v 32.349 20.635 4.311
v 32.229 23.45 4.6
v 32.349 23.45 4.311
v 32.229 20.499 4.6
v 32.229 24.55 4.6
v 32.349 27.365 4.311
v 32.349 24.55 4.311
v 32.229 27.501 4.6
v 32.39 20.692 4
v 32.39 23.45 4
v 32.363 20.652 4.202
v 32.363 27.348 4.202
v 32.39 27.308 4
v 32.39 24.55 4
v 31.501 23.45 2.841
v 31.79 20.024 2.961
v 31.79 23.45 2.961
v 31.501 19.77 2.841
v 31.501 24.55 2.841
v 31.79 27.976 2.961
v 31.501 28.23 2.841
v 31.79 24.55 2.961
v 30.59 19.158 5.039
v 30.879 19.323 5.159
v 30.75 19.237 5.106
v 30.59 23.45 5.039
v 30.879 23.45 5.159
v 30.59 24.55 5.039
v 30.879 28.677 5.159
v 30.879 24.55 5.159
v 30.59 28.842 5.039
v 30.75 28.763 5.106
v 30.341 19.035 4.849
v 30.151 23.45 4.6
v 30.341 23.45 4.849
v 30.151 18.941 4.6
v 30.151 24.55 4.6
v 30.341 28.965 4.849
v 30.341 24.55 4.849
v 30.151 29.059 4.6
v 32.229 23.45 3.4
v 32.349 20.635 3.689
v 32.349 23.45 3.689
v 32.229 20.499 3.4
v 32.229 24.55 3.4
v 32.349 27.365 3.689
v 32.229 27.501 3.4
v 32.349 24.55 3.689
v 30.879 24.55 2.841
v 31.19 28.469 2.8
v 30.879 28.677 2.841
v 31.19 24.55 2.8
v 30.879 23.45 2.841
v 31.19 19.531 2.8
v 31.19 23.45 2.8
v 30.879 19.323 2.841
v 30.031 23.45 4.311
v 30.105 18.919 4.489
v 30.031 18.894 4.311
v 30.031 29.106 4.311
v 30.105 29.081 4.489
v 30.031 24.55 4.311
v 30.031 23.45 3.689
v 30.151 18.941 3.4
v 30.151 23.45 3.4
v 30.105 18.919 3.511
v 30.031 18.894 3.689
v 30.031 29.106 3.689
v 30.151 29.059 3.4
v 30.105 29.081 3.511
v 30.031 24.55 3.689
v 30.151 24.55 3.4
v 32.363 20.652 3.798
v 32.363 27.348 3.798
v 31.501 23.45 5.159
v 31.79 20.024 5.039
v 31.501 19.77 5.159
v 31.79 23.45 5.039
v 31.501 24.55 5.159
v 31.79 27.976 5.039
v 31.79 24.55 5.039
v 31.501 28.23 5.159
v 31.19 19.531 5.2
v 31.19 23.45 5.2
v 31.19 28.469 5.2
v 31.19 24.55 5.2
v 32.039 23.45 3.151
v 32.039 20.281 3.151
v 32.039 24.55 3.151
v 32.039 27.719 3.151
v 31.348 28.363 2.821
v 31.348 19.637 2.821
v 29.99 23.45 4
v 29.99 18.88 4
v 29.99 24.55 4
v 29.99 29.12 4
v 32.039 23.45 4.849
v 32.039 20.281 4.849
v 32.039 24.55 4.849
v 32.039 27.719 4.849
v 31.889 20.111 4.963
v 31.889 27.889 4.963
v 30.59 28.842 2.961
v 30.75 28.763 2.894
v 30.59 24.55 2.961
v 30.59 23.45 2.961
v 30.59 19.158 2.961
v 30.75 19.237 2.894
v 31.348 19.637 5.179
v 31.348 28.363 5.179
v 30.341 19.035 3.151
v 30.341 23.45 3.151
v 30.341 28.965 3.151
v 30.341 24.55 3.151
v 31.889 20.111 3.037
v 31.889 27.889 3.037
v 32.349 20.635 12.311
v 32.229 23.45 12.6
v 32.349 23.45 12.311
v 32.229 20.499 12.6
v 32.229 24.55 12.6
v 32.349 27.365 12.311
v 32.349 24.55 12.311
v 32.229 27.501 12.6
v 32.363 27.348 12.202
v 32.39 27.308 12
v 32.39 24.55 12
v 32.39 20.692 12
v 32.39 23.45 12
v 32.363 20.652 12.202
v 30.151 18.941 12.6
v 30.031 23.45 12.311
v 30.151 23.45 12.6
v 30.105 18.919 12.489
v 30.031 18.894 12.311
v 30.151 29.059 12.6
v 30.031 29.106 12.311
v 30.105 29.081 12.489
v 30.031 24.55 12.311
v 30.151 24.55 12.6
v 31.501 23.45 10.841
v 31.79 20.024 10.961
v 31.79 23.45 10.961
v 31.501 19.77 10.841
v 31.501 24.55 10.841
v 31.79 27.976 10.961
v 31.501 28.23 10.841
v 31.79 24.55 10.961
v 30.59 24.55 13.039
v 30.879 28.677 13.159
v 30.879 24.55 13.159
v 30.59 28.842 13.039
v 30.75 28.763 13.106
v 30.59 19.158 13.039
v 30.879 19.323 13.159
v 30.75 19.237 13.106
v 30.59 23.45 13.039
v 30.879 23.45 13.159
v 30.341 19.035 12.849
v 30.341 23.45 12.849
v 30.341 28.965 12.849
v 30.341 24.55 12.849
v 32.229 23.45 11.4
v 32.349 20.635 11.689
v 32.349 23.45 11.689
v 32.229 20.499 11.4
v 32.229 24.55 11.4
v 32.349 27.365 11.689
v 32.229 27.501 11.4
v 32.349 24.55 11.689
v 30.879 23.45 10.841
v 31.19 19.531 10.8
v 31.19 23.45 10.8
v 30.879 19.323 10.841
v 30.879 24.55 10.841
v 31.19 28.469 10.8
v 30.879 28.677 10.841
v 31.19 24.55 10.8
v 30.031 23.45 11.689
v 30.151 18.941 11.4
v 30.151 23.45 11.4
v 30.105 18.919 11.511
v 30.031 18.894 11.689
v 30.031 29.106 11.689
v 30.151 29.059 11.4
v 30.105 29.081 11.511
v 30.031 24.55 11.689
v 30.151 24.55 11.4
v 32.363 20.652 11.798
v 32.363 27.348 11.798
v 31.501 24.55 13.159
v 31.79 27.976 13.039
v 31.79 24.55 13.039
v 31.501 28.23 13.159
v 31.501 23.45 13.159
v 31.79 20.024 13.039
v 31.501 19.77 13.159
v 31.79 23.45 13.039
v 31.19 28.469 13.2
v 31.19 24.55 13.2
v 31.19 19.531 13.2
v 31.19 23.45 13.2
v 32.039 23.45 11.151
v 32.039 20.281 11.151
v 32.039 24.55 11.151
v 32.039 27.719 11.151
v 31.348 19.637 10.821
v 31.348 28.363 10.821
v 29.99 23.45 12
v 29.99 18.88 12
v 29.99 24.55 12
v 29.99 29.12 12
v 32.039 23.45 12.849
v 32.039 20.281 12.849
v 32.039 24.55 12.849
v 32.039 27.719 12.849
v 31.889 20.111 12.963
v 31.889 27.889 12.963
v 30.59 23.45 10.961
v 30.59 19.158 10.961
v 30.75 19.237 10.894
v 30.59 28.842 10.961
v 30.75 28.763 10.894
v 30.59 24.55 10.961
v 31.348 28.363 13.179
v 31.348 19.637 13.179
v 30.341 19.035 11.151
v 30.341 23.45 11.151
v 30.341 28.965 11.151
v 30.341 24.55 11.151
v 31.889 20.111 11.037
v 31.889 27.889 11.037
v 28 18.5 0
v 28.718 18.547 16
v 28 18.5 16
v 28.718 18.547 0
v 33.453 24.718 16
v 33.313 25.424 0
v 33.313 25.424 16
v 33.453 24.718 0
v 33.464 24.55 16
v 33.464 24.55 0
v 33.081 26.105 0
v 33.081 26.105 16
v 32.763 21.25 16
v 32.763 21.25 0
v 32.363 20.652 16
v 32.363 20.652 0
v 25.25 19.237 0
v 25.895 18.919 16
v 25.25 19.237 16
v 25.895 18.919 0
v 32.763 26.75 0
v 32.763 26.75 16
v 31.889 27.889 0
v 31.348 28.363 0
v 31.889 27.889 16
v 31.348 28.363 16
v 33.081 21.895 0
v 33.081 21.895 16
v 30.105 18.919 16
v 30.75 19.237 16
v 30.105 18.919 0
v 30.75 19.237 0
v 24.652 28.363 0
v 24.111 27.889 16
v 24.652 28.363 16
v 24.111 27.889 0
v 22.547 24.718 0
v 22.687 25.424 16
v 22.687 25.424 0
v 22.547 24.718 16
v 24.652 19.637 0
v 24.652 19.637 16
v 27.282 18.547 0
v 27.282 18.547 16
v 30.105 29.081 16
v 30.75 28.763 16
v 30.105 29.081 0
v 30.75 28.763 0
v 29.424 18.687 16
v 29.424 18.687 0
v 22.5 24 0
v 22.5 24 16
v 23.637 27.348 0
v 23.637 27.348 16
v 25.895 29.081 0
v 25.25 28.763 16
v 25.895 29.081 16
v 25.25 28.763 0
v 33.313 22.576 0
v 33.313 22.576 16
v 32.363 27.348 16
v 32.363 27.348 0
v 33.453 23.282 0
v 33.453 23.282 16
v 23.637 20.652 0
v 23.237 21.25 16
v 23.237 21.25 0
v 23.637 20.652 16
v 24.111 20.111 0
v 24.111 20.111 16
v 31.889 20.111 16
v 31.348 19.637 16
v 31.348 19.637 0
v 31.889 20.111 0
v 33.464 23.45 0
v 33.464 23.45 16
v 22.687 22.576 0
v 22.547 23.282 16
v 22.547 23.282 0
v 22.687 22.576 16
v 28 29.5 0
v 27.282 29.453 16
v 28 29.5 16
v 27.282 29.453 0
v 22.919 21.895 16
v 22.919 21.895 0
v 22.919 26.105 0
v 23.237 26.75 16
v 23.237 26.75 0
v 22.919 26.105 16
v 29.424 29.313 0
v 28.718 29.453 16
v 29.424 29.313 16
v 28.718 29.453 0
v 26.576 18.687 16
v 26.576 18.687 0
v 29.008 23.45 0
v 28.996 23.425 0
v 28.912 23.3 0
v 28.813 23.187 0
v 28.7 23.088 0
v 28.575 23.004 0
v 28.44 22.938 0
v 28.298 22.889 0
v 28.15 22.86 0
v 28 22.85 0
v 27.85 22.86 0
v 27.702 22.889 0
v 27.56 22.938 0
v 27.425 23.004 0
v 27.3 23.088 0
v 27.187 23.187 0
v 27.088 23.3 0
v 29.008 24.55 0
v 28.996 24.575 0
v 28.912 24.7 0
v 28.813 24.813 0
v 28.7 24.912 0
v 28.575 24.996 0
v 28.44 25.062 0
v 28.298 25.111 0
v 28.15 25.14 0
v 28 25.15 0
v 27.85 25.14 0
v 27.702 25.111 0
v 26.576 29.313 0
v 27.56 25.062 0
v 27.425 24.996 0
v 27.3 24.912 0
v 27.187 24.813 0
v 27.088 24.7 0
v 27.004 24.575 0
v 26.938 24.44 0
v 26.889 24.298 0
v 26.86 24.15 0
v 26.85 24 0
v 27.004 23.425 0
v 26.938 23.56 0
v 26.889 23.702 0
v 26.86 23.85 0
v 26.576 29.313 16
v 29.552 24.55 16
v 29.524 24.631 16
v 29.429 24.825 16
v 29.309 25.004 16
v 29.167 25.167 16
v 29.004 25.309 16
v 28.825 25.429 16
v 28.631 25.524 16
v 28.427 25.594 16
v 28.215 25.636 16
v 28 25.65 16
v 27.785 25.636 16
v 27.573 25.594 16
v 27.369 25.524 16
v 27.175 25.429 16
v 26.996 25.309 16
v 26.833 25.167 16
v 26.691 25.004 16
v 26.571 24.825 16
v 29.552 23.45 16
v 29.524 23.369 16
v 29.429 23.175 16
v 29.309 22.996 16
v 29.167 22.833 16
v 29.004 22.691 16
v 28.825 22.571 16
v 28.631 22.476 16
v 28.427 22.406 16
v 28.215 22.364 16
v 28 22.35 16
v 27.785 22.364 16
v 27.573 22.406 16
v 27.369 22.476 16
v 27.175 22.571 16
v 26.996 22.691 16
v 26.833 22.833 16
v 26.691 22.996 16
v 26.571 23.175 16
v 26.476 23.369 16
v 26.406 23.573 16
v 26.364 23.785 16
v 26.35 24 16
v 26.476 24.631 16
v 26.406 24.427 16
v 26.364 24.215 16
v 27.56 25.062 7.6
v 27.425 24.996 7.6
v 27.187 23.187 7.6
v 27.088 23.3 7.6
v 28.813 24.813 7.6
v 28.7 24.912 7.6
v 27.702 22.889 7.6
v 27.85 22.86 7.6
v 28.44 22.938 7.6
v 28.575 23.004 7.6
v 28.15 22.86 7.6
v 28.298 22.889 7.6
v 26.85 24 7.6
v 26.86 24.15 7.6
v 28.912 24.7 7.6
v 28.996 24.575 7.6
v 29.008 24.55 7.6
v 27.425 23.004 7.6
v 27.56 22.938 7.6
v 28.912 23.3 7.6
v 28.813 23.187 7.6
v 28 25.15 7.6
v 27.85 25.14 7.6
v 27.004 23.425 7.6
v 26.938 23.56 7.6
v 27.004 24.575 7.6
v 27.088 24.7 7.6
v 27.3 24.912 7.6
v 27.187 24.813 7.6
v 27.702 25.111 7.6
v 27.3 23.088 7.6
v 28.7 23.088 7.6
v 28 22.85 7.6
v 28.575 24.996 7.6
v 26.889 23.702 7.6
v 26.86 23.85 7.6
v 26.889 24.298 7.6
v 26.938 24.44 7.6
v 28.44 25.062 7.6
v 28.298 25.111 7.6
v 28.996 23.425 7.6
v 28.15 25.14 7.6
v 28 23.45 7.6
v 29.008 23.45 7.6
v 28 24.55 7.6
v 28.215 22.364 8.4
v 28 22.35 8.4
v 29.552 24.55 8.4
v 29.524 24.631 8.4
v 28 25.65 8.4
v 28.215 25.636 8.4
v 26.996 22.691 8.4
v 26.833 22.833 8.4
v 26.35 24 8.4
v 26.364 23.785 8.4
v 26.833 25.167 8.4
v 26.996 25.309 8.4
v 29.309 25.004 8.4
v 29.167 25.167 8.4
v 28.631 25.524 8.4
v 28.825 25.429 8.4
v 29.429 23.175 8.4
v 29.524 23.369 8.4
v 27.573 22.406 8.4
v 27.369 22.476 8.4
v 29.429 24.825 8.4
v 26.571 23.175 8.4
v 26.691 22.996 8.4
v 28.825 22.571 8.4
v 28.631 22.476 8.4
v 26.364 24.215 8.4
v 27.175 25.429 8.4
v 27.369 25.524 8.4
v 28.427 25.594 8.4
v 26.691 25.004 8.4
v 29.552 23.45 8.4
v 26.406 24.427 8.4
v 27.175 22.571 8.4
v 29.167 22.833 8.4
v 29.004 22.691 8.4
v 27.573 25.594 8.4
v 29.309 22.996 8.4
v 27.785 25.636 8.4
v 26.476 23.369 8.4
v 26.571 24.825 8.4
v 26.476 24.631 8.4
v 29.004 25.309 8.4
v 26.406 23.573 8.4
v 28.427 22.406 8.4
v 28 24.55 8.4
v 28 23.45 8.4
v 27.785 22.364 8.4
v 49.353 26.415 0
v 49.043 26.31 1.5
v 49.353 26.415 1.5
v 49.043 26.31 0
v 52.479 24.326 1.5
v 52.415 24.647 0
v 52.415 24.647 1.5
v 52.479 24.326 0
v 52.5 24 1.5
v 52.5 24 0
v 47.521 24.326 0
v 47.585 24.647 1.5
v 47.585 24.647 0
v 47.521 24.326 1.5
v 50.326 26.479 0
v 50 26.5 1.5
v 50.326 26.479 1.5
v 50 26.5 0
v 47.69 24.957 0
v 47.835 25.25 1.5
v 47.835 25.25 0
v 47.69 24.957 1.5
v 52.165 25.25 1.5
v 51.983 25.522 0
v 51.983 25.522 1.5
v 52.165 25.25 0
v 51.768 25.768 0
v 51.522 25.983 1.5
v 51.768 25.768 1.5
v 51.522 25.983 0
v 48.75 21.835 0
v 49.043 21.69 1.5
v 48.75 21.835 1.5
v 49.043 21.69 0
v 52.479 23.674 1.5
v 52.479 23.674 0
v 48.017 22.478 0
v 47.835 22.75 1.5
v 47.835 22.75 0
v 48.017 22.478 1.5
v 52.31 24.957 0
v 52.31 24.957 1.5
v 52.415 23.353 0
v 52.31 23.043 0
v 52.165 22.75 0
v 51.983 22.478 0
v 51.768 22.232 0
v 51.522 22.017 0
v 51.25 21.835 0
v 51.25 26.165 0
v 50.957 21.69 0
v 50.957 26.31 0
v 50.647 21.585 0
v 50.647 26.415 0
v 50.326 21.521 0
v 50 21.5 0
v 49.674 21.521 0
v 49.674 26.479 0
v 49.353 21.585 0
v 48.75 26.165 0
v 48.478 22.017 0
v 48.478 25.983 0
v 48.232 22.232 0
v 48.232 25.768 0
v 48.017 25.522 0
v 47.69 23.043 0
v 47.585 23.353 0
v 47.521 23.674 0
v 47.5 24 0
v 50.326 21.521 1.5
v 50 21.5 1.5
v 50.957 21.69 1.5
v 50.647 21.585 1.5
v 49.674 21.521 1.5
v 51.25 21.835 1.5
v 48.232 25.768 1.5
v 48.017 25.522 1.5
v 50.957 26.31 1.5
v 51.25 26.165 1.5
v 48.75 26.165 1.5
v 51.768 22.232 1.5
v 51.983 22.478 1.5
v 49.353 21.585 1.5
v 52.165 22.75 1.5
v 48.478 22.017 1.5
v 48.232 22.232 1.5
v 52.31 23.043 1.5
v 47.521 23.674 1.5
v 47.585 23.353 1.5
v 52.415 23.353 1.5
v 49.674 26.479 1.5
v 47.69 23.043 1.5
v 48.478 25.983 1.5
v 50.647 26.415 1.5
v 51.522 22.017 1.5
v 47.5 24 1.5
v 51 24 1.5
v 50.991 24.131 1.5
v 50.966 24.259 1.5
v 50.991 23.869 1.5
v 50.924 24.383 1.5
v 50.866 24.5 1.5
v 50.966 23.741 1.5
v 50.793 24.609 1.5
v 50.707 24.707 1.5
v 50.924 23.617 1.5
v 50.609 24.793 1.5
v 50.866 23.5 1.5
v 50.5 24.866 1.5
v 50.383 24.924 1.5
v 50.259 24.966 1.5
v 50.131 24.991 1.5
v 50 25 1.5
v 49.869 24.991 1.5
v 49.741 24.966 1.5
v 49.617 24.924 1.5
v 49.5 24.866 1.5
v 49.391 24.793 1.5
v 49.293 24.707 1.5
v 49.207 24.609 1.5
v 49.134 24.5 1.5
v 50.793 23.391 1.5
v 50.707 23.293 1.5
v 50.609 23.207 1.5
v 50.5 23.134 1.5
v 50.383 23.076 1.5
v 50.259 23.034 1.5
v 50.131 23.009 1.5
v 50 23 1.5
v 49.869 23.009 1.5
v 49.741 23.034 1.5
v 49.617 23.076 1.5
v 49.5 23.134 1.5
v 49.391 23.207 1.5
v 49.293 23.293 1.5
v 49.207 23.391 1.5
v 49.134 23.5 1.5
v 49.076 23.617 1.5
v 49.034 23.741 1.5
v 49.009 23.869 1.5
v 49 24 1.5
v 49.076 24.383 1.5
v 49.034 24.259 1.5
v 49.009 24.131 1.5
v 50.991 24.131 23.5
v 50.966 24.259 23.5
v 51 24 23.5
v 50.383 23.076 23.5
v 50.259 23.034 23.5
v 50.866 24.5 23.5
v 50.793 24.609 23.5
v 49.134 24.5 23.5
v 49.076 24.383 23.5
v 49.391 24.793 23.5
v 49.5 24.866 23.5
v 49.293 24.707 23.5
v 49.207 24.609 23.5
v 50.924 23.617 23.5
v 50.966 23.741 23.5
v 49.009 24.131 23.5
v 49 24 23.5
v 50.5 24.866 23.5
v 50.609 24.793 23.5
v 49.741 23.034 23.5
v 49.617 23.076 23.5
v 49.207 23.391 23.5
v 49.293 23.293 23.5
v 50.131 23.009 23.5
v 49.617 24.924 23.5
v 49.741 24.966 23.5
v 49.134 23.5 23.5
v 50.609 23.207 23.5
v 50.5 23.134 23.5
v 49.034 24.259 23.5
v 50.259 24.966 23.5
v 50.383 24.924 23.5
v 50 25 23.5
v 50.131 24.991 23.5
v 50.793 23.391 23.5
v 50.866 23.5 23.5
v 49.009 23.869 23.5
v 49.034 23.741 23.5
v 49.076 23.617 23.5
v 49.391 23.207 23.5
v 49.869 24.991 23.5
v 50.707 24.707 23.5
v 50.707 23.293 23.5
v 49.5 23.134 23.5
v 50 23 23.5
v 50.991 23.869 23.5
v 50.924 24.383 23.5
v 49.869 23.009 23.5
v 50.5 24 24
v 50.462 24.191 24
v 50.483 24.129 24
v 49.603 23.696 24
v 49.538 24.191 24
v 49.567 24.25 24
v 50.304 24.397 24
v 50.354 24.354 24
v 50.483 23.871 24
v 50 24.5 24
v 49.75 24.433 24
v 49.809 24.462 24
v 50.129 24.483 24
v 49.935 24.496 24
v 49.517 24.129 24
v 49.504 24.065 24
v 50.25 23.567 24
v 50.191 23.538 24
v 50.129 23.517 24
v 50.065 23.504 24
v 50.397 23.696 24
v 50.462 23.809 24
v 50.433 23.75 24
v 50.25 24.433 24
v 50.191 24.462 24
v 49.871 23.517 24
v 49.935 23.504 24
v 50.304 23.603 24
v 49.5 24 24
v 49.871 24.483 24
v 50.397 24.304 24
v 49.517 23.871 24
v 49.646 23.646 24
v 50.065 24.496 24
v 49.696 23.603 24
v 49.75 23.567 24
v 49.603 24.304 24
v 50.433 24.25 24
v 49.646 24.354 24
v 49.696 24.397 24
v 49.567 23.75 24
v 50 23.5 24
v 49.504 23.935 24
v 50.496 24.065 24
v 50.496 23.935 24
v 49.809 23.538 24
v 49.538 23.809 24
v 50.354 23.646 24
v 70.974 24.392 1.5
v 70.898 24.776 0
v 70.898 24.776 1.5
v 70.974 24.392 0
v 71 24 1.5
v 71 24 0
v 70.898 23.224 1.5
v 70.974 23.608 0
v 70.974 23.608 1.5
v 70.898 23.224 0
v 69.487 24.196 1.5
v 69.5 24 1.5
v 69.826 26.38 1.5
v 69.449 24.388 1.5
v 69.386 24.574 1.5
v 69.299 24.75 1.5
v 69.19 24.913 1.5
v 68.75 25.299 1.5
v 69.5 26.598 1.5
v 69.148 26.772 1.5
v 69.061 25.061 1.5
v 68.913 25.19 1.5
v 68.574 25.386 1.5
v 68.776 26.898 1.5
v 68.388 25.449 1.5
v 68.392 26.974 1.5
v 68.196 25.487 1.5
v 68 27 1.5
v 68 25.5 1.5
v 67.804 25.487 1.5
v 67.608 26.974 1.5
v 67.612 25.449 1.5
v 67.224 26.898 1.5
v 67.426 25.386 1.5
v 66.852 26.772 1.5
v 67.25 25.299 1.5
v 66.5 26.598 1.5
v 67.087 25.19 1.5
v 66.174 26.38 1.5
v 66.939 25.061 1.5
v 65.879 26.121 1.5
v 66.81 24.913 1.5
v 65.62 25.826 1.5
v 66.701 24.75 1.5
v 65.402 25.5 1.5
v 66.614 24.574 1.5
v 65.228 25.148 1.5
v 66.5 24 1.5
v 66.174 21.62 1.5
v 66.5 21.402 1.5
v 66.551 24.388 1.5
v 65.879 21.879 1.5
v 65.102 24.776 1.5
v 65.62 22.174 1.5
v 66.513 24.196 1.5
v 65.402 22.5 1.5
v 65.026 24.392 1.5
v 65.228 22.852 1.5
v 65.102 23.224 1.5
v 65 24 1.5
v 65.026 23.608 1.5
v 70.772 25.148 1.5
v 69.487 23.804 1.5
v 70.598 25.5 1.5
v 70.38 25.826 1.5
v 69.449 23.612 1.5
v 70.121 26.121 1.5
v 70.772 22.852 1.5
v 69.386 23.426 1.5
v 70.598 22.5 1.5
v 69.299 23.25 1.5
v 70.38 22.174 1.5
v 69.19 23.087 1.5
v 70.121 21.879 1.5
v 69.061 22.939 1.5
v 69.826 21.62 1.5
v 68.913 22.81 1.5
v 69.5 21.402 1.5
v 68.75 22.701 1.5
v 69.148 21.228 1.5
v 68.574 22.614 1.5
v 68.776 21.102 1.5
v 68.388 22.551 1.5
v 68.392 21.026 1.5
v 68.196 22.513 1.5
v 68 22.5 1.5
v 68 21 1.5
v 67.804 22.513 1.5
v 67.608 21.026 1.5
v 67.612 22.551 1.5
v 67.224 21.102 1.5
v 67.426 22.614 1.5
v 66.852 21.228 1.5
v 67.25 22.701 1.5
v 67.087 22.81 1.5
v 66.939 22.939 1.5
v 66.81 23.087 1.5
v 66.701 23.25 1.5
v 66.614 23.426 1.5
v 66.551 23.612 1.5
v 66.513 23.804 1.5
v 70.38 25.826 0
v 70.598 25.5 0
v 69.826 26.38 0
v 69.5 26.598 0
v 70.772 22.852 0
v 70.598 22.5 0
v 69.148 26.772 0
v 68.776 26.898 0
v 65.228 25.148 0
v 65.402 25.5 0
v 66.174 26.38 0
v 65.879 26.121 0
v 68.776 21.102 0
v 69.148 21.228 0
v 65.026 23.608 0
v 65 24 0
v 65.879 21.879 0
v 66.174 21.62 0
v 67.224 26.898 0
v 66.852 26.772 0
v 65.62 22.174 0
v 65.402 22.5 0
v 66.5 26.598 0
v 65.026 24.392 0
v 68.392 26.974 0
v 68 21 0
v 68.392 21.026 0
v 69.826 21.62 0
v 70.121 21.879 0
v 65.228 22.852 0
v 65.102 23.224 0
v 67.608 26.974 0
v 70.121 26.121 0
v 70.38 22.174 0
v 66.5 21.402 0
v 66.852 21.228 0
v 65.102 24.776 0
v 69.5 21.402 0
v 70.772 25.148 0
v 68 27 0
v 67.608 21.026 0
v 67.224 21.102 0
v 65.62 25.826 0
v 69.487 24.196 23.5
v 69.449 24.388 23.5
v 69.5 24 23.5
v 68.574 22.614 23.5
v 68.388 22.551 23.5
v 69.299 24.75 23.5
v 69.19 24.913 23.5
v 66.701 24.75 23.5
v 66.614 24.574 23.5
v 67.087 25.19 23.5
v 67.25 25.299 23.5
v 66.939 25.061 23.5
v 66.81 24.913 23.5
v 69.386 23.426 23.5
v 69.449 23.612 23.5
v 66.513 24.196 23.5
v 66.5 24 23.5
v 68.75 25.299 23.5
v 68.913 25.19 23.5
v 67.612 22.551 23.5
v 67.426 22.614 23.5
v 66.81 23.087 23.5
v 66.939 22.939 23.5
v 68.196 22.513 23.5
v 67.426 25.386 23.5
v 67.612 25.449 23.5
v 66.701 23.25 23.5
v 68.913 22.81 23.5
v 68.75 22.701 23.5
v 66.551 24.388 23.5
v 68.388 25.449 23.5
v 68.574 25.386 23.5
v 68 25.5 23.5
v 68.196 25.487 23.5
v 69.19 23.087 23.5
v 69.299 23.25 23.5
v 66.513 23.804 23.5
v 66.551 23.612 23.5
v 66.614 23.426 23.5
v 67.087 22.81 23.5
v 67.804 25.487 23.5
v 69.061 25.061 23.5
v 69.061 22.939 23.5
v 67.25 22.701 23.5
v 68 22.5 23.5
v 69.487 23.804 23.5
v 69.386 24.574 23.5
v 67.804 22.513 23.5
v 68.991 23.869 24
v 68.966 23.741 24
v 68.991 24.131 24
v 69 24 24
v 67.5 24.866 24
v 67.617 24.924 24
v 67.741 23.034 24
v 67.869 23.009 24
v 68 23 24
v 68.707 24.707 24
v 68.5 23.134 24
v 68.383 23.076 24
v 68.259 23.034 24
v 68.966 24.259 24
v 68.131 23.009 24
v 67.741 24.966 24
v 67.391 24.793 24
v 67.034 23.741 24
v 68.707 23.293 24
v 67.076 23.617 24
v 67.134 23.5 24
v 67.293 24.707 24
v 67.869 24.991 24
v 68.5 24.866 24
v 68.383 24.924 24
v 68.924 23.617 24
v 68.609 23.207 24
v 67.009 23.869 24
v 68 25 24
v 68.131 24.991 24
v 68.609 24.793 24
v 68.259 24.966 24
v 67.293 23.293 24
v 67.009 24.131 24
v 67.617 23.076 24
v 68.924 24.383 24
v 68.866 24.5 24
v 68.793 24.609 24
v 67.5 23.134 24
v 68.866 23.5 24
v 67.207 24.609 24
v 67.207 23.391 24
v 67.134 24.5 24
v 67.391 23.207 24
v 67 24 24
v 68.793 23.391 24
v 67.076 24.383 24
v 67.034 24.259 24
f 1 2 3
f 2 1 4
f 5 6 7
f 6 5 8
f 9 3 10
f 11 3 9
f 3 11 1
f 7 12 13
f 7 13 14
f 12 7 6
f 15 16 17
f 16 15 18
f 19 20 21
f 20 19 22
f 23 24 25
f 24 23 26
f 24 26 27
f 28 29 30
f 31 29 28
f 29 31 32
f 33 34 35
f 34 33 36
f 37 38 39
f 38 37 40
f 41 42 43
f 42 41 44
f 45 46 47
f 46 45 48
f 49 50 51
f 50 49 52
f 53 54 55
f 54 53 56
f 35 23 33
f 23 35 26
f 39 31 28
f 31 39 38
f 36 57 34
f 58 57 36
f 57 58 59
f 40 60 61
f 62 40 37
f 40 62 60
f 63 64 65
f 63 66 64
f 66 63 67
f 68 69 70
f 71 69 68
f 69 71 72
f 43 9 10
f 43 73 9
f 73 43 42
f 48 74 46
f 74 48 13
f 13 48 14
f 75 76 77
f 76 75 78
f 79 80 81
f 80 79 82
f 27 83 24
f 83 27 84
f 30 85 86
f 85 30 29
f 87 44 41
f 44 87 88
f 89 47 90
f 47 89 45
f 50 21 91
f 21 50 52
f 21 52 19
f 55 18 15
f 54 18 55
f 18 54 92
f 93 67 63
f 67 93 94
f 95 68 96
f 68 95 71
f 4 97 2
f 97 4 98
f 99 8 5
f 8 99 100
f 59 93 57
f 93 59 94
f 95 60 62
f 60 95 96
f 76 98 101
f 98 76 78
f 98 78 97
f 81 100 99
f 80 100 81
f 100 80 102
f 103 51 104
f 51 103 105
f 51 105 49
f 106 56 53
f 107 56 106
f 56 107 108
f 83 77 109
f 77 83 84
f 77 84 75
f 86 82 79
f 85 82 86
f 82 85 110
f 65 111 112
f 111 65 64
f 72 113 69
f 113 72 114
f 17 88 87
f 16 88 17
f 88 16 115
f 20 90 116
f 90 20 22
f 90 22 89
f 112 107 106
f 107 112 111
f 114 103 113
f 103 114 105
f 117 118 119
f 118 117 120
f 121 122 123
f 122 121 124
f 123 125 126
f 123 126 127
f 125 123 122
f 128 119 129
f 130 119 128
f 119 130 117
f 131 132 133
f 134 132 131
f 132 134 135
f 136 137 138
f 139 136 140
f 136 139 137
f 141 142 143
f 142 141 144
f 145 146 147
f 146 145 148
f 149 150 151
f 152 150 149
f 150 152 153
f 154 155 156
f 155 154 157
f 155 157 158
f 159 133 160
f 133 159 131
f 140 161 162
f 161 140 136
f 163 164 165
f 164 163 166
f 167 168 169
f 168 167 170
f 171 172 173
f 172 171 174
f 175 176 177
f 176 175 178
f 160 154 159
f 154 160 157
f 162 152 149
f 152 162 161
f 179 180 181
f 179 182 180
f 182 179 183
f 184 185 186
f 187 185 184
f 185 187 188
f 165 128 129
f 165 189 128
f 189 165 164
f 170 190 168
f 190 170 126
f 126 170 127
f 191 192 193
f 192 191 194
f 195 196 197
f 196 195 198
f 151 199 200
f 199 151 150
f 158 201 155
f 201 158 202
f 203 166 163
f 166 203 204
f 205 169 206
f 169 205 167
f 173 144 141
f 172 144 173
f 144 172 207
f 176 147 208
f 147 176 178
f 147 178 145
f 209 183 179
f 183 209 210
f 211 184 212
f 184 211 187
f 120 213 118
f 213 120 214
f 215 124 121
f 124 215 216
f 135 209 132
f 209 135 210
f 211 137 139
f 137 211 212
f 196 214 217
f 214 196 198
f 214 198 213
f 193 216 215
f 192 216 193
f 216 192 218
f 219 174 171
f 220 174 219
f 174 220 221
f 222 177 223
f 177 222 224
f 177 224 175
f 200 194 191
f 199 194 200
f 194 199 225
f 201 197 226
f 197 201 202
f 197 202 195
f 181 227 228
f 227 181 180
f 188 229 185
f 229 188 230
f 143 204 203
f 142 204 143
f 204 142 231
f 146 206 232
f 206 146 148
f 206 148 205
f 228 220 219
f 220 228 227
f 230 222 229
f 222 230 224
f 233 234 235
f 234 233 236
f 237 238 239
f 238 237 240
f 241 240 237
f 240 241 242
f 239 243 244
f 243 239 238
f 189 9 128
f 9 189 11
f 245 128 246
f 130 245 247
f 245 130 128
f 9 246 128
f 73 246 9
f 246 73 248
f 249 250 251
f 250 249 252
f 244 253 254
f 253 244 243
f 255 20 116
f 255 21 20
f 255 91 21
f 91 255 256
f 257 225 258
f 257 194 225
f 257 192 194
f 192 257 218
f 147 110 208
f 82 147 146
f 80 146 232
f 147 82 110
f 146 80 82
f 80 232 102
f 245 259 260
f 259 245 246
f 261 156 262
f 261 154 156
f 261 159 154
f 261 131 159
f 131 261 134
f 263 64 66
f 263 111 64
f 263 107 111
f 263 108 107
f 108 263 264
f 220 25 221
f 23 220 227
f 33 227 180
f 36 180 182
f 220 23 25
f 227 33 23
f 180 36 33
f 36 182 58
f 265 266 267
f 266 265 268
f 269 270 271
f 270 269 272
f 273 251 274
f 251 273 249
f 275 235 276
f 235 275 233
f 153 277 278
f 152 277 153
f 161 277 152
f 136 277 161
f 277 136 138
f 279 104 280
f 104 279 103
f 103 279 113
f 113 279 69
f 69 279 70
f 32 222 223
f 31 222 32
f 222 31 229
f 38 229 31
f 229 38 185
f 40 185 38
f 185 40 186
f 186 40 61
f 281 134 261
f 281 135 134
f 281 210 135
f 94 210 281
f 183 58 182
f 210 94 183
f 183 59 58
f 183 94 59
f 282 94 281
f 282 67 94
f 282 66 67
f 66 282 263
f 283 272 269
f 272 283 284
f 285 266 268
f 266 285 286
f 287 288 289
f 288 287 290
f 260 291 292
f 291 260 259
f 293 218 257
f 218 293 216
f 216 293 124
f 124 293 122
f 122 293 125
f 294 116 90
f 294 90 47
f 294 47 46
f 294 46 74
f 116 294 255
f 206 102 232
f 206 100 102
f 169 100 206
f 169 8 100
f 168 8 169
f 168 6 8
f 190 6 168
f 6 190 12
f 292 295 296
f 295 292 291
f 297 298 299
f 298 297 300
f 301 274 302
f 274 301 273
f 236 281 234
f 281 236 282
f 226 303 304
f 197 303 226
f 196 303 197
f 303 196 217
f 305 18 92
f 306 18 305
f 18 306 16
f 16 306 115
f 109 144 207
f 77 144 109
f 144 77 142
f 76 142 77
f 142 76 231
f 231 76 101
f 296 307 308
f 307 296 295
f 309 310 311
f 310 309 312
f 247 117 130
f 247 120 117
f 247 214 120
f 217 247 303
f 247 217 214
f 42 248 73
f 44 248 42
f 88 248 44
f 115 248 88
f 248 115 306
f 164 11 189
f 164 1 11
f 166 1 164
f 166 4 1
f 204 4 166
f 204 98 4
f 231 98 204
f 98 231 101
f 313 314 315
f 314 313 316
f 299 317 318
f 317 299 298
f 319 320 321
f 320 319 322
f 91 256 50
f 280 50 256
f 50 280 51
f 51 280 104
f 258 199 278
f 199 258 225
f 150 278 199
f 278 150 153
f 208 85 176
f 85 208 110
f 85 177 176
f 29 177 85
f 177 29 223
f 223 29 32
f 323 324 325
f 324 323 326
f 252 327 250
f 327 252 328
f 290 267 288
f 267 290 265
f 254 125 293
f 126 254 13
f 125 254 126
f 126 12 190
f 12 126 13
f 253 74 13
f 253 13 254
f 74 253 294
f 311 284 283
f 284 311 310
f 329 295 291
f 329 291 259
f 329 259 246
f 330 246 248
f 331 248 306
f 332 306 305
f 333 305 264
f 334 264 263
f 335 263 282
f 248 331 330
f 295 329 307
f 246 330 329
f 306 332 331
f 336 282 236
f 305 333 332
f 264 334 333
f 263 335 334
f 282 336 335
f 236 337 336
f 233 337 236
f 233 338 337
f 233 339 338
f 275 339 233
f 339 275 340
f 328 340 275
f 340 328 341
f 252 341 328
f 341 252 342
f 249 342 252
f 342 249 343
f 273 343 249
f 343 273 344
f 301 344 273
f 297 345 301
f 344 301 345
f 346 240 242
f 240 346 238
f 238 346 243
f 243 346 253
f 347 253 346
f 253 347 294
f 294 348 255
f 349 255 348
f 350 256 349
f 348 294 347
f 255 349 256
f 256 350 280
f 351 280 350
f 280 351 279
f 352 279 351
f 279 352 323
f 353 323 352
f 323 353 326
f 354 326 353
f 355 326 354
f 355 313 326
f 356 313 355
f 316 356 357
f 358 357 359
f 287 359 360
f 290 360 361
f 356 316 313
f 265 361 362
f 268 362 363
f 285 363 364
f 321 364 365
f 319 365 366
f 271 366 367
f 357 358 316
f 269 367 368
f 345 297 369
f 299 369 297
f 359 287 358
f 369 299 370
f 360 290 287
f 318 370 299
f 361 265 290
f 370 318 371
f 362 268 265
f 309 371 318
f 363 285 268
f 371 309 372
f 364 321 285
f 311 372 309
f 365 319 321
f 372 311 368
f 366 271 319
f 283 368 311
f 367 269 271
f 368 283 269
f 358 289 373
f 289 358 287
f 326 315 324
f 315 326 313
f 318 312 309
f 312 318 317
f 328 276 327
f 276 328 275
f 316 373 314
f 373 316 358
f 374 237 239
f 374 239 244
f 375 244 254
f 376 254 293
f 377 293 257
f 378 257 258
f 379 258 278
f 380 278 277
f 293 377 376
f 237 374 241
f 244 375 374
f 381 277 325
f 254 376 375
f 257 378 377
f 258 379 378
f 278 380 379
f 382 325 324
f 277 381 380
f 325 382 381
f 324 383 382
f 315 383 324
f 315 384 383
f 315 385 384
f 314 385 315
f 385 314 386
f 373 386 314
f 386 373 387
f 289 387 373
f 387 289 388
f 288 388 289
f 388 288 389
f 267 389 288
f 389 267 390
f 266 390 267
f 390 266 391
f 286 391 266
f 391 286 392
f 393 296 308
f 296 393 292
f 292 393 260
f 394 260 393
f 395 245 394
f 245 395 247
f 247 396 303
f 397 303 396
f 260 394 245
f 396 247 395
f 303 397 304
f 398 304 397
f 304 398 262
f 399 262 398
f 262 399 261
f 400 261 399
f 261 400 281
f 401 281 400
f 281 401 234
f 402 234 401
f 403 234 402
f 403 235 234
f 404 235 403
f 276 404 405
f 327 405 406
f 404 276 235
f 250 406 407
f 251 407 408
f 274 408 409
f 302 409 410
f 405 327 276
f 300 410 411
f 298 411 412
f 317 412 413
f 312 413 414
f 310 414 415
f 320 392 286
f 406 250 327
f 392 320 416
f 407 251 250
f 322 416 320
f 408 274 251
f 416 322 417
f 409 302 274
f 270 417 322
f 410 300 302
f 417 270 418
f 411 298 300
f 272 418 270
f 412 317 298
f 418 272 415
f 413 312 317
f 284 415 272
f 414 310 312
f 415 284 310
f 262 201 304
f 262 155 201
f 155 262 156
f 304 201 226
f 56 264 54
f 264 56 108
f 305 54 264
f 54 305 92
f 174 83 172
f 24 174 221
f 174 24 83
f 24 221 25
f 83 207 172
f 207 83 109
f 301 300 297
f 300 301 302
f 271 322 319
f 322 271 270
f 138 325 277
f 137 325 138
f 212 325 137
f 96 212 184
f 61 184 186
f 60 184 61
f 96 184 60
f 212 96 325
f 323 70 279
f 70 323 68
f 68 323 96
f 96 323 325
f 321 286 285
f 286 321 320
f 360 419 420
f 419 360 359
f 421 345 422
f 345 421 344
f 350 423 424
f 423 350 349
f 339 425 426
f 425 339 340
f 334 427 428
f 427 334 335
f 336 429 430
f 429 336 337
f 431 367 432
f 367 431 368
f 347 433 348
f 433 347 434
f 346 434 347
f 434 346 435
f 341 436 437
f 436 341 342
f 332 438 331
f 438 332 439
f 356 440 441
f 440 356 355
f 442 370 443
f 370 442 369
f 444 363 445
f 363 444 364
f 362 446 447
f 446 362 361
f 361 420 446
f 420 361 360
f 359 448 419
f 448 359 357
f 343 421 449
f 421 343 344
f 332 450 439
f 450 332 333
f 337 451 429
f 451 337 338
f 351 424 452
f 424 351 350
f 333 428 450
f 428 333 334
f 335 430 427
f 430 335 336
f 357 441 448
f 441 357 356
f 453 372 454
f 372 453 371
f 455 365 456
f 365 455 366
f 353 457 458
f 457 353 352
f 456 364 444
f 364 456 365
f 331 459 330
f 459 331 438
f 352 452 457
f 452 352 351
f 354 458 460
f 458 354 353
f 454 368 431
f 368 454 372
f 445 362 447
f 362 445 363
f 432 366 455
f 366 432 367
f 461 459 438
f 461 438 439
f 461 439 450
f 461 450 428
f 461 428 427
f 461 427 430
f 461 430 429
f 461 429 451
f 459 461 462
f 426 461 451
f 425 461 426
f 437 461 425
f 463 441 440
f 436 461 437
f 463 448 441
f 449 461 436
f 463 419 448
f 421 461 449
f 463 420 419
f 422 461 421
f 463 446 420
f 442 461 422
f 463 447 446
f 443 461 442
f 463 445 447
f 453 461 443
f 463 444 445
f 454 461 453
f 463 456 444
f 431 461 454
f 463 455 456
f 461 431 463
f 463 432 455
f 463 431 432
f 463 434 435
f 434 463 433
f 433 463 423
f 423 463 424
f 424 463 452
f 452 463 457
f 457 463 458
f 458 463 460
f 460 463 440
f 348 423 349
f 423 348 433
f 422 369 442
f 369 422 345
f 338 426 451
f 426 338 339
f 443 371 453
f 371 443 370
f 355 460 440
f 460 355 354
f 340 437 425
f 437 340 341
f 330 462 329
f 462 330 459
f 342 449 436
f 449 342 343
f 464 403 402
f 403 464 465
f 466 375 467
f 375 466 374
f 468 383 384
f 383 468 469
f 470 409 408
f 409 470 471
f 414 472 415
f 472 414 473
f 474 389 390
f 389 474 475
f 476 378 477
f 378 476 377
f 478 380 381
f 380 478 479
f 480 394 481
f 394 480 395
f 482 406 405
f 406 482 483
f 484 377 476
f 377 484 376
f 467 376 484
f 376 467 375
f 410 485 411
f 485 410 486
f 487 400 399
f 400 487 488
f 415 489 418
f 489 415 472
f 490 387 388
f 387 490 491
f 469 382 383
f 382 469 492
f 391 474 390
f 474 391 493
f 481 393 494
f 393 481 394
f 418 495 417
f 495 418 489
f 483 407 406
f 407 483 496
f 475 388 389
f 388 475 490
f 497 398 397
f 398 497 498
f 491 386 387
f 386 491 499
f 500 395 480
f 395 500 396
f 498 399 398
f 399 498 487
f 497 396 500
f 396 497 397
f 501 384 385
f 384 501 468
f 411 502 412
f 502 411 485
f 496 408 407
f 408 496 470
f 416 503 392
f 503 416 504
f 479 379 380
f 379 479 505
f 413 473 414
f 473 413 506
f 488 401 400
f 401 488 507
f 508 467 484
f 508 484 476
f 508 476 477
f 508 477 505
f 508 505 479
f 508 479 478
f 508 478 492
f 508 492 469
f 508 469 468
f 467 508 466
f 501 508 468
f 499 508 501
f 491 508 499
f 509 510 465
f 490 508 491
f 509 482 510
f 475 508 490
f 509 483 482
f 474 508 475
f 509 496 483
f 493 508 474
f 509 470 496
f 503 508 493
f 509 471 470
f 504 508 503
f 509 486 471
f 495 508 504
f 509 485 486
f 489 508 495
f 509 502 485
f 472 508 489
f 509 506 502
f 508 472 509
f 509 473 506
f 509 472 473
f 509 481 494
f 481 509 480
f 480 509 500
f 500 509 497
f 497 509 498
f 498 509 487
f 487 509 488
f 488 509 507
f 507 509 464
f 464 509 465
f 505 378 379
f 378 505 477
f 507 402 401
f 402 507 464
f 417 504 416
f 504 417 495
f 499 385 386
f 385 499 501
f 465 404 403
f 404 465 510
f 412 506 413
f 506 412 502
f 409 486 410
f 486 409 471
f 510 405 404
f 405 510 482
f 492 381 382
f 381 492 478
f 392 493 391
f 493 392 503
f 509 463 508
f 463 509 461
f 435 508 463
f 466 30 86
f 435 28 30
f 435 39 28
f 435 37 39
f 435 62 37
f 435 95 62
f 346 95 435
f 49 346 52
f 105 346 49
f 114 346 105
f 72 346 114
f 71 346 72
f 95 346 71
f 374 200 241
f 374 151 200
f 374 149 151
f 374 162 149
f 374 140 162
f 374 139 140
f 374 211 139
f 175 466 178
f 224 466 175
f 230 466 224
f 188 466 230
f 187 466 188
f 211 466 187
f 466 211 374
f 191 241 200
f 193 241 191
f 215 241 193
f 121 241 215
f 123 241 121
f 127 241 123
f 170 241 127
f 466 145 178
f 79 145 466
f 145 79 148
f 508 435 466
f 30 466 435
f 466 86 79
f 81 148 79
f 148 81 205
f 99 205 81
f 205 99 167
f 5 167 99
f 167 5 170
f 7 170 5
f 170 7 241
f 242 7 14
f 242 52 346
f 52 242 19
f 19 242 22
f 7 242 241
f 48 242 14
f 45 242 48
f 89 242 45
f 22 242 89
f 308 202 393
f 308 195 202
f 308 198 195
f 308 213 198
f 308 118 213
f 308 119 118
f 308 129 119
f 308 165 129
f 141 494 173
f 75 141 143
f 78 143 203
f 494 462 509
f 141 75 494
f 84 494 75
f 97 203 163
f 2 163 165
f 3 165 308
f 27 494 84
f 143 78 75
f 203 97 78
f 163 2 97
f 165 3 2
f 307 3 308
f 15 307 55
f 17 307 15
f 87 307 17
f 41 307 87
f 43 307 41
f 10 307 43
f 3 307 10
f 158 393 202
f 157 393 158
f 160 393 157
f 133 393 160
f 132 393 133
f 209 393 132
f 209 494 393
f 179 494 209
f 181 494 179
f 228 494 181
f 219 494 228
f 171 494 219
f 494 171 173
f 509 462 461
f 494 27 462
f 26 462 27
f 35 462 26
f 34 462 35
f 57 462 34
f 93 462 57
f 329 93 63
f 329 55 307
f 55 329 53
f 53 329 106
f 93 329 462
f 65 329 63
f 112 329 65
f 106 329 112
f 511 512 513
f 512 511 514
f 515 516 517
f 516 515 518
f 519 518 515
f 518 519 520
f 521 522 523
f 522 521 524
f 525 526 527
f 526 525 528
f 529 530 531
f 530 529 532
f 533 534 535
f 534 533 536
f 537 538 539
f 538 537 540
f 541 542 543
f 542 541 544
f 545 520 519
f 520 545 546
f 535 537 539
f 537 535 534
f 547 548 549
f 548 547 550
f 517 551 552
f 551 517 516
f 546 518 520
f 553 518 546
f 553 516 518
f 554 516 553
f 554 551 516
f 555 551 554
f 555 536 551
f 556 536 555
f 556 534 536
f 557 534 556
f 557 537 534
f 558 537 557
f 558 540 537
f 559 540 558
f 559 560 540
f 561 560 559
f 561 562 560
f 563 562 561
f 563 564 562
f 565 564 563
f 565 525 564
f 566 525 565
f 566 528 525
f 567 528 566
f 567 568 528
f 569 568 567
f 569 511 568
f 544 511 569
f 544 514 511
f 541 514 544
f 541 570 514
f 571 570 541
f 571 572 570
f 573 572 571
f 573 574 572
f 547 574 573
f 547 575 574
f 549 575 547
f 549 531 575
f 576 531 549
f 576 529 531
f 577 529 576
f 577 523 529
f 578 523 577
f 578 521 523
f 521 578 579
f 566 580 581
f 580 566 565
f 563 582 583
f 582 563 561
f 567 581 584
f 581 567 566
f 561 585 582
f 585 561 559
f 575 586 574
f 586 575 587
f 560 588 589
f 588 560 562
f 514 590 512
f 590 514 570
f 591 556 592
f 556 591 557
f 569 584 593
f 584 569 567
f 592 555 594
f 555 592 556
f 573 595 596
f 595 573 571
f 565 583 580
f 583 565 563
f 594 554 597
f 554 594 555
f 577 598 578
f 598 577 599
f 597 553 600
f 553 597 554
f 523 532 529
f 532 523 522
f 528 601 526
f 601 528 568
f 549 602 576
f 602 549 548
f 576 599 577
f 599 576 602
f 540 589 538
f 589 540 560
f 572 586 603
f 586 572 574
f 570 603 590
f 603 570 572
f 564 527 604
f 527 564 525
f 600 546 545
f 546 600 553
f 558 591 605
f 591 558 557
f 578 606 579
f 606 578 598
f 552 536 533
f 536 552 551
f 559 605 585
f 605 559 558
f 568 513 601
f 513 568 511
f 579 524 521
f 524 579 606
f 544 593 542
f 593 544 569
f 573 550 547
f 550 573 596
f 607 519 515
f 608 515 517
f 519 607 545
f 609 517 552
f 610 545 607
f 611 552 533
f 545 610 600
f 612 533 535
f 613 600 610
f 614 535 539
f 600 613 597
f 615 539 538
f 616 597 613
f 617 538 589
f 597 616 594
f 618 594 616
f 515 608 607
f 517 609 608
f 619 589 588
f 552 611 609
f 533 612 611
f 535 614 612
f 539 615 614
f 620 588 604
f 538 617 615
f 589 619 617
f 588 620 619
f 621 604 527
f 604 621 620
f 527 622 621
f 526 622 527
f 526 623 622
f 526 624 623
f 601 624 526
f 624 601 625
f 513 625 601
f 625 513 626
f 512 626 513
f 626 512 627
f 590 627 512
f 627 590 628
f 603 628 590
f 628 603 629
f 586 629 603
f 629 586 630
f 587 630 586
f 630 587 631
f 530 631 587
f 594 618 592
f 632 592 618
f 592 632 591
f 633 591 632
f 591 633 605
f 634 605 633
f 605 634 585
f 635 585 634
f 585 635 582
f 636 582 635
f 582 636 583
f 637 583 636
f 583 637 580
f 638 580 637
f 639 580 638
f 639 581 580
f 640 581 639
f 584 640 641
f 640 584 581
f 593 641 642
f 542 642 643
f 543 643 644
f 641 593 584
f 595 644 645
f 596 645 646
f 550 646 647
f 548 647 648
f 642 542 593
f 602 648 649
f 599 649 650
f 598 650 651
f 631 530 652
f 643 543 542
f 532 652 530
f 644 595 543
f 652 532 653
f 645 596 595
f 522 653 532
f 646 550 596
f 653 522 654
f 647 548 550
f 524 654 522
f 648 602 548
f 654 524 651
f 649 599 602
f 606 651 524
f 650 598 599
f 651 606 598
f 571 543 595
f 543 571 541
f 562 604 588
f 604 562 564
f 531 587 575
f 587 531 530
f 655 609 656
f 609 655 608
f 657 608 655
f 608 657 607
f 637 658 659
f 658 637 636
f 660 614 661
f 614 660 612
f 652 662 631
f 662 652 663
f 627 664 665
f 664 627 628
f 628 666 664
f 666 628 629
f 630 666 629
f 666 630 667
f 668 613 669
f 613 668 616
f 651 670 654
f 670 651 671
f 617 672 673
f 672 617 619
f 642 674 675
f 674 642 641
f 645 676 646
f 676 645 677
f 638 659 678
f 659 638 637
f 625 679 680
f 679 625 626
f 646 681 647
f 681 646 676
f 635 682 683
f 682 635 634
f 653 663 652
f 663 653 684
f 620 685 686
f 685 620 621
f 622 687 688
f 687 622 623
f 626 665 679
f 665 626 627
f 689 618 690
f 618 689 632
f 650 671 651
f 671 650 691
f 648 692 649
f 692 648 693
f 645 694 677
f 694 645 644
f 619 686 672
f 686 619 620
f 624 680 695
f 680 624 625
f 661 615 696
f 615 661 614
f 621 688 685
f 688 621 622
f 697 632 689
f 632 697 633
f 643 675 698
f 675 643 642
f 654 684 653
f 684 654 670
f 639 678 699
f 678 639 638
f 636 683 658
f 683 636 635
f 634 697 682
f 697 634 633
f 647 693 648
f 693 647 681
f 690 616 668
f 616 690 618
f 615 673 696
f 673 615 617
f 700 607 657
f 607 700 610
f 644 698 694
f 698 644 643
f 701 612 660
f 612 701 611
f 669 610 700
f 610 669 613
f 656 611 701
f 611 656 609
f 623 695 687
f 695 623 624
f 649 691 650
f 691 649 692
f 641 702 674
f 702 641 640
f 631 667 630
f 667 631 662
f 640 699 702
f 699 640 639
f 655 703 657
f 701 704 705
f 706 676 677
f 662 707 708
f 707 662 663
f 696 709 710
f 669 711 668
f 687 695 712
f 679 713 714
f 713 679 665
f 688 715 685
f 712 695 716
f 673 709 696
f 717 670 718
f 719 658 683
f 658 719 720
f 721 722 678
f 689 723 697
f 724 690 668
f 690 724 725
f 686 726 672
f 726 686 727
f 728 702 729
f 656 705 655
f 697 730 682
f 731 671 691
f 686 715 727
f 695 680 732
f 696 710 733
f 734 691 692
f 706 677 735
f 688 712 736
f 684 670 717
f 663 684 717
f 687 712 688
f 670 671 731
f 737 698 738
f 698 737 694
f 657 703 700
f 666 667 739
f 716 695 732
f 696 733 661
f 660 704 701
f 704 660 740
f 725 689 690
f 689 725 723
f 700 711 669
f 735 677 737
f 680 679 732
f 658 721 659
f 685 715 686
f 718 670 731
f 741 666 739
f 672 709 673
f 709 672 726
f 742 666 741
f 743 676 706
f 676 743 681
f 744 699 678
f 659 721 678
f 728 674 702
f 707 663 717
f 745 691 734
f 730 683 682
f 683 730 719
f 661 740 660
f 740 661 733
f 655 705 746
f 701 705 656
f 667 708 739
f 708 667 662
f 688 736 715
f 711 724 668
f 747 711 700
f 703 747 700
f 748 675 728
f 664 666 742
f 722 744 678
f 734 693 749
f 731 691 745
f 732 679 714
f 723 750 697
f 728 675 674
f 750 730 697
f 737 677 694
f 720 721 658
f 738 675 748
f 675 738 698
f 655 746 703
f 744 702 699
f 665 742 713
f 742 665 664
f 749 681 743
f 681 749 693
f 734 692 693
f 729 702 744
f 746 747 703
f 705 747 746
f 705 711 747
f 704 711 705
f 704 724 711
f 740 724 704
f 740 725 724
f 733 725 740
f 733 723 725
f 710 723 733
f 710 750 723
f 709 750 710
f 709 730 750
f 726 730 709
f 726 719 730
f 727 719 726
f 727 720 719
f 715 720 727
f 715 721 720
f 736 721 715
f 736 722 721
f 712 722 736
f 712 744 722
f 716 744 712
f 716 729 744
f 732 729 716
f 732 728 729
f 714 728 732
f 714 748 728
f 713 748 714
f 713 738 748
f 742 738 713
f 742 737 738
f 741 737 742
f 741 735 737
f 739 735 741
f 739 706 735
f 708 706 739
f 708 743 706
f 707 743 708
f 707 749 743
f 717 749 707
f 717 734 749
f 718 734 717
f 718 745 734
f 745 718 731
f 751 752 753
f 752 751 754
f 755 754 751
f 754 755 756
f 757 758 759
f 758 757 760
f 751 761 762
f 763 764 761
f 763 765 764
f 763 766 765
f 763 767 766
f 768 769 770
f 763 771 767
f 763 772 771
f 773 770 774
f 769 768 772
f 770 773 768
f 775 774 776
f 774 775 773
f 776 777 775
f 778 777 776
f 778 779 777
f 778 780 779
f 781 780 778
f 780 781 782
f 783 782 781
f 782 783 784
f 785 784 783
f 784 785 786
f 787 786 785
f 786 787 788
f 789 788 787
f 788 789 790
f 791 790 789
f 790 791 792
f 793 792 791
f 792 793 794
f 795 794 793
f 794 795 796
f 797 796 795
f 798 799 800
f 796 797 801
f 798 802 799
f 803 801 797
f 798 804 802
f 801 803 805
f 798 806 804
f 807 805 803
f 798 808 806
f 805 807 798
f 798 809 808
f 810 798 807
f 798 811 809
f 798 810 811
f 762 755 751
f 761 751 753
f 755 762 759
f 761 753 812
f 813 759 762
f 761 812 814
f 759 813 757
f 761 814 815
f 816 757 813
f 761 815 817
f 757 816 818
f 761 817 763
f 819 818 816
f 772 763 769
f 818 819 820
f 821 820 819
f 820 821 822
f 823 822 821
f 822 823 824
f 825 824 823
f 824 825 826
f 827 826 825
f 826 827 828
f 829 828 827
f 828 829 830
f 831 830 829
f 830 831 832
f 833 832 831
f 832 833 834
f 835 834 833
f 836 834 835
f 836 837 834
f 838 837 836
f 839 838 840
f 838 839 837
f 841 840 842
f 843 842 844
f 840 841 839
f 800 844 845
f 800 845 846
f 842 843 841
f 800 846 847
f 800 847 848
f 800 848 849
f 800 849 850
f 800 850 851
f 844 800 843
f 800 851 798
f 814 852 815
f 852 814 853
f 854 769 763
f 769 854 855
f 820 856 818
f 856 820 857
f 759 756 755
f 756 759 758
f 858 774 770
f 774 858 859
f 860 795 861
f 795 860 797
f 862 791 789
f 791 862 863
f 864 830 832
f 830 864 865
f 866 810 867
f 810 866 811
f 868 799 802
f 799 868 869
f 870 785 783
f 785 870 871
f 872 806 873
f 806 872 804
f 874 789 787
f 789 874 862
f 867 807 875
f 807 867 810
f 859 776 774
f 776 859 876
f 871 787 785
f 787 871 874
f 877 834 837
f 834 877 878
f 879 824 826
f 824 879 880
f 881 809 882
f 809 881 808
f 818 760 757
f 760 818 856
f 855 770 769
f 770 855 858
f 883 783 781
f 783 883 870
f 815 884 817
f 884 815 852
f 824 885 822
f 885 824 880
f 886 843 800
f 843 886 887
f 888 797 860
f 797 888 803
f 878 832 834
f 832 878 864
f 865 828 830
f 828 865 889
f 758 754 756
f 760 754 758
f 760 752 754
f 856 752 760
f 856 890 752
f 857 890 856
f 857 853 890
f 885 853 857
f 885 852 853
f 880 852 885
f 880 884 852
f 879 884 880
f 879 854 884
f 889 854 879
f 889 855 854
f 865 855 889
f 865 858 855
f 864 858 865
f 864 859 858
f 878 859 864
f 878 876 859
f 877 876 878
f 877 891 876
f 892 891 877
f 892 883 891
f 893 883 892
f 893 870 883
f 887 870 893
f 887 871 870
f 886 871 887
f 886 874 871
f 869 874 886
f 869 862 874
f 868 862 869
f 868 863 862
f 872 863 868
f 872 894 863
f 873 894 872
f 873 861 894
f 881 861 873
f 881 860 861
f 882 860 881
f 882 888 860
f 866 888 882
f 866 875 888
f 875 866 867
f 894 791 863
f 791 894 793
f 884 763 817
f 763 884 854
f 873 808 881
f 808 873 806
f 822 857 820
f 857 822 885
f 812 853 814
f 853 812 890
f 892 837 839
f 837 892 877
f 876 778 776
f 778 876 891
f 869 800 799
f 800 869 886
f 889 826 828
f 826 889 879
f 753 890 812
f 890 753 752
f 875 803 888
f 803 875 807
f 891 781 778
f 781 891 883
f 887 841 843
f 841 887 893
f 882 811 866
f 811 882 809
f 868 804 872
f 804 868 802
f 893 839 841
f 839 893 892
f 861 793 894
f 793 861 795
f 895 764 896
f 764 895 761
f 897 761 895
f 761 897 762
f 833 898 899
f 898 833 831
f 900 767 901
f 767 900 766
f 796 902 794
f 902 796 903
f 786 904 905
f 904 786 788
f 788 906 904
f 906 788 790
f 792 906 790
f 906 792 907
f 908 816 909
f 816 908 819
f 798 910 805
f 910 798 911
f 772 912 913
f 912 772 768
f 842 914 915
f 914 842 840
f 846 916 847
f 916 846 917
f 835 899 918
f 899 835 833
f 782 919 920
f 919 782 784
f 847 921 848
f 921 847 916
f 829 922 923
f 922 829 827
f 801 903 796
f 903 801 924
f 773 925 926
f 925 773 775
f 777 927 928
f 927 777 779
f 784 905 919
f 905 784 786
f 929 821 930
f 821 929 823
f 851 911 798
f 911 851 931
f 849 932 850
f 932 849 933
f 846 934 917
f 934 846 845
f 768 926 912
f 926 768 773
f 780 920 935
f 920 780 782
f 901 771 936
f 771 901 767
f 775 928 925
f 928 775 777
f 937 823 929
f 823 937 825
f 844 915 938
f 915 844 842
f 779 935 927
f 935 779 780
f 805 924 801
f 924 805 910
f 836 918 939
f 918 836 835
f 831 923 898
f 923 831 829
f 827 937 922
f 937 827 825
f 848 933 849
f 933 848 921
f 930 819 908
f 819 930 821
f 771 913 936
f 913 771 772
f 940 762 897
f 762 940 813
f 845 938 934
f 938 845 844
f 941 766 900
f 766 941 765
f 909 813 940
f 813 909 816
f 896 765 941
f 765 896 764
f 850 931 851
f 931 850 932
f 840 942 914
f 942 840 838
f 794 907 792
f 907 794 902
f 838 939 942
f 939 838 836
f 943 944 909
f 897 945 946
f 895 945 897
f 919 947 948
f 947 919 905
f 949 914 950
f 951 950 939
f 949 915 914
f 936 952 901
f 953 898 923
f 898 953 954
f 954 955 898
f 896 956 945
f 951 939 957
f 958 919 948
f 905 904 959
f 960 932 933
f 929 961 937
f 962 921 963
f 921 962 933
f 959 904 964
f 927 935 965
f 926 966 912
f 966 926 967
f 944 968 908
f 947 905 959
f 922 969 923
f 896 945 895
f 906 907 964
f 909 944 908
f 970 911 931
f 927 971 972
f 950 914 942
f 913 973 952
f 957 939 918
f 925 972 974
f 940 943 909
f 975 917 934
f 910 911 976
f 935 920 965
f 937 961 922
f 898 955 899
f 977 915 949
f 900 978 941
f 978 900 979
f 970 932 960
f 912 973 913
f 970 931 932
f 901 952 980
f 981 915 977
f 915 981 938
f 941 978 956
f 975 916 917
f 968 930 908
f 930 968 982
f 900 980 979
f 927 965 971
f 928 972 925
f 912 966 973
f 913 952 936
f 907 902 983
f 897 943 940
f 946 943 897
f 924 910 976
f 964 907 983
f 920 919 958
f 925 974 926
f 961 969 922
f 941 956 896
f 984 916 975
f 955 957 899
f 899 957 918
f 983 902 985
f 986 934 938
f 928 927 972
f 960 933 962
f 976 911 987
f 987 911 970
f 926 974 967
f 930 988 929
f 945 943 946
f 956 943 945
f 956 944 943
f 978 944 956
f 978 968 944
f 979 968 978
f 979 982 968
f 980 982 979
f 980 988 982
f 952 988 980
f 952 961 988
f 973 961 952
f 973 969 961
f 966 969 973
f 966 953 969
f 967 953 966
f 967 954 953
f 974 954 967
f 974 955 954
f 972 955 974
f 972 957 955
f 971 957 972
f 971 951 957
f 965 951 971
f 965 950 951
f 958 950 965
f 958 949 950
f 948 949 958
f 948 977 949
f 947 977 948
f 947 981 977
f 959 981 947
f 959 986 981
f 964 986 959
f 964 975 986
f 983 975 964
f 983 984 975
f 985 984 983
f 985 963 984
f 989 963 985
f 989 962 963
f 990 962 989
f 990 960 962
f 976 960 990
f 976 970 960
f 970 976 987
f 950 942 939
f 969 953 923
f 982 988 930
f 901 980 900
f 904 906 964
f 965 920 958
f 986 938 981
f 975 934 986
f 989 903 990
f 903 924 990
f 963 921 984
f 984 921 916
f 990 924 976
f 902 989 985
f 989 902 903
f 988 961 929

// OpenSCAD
/*
Sample 129: Kompakte asymmetrische Wellenkupplung — 2 auf 3 mm
Generated from the FDM Mechanical Sample Library.
Units: millimetres.

Override examples:
  openscad -o custom.stl -D 'view="plate"' -D 'render_fn=64' model.scad
  openscad -o preview.png -D 'view="assembly"' model.scad
*/
use <../../../library/fdm_mechanisms.scad>

render_fn = is_undef(render_fn) ? 48 : render_fn;
view = is_undef(view) ? "plate" : view;
$fn = render_fn;

sample_micro_shaft_coupler(
    view=view,
    input_d=2,
    output_d=3,
    input_clearance=0.15,
    output_clearance=0.15,
    length=16,
    outer_d=11,
    fastener=2.4,
    axial_stop=0.8
);
